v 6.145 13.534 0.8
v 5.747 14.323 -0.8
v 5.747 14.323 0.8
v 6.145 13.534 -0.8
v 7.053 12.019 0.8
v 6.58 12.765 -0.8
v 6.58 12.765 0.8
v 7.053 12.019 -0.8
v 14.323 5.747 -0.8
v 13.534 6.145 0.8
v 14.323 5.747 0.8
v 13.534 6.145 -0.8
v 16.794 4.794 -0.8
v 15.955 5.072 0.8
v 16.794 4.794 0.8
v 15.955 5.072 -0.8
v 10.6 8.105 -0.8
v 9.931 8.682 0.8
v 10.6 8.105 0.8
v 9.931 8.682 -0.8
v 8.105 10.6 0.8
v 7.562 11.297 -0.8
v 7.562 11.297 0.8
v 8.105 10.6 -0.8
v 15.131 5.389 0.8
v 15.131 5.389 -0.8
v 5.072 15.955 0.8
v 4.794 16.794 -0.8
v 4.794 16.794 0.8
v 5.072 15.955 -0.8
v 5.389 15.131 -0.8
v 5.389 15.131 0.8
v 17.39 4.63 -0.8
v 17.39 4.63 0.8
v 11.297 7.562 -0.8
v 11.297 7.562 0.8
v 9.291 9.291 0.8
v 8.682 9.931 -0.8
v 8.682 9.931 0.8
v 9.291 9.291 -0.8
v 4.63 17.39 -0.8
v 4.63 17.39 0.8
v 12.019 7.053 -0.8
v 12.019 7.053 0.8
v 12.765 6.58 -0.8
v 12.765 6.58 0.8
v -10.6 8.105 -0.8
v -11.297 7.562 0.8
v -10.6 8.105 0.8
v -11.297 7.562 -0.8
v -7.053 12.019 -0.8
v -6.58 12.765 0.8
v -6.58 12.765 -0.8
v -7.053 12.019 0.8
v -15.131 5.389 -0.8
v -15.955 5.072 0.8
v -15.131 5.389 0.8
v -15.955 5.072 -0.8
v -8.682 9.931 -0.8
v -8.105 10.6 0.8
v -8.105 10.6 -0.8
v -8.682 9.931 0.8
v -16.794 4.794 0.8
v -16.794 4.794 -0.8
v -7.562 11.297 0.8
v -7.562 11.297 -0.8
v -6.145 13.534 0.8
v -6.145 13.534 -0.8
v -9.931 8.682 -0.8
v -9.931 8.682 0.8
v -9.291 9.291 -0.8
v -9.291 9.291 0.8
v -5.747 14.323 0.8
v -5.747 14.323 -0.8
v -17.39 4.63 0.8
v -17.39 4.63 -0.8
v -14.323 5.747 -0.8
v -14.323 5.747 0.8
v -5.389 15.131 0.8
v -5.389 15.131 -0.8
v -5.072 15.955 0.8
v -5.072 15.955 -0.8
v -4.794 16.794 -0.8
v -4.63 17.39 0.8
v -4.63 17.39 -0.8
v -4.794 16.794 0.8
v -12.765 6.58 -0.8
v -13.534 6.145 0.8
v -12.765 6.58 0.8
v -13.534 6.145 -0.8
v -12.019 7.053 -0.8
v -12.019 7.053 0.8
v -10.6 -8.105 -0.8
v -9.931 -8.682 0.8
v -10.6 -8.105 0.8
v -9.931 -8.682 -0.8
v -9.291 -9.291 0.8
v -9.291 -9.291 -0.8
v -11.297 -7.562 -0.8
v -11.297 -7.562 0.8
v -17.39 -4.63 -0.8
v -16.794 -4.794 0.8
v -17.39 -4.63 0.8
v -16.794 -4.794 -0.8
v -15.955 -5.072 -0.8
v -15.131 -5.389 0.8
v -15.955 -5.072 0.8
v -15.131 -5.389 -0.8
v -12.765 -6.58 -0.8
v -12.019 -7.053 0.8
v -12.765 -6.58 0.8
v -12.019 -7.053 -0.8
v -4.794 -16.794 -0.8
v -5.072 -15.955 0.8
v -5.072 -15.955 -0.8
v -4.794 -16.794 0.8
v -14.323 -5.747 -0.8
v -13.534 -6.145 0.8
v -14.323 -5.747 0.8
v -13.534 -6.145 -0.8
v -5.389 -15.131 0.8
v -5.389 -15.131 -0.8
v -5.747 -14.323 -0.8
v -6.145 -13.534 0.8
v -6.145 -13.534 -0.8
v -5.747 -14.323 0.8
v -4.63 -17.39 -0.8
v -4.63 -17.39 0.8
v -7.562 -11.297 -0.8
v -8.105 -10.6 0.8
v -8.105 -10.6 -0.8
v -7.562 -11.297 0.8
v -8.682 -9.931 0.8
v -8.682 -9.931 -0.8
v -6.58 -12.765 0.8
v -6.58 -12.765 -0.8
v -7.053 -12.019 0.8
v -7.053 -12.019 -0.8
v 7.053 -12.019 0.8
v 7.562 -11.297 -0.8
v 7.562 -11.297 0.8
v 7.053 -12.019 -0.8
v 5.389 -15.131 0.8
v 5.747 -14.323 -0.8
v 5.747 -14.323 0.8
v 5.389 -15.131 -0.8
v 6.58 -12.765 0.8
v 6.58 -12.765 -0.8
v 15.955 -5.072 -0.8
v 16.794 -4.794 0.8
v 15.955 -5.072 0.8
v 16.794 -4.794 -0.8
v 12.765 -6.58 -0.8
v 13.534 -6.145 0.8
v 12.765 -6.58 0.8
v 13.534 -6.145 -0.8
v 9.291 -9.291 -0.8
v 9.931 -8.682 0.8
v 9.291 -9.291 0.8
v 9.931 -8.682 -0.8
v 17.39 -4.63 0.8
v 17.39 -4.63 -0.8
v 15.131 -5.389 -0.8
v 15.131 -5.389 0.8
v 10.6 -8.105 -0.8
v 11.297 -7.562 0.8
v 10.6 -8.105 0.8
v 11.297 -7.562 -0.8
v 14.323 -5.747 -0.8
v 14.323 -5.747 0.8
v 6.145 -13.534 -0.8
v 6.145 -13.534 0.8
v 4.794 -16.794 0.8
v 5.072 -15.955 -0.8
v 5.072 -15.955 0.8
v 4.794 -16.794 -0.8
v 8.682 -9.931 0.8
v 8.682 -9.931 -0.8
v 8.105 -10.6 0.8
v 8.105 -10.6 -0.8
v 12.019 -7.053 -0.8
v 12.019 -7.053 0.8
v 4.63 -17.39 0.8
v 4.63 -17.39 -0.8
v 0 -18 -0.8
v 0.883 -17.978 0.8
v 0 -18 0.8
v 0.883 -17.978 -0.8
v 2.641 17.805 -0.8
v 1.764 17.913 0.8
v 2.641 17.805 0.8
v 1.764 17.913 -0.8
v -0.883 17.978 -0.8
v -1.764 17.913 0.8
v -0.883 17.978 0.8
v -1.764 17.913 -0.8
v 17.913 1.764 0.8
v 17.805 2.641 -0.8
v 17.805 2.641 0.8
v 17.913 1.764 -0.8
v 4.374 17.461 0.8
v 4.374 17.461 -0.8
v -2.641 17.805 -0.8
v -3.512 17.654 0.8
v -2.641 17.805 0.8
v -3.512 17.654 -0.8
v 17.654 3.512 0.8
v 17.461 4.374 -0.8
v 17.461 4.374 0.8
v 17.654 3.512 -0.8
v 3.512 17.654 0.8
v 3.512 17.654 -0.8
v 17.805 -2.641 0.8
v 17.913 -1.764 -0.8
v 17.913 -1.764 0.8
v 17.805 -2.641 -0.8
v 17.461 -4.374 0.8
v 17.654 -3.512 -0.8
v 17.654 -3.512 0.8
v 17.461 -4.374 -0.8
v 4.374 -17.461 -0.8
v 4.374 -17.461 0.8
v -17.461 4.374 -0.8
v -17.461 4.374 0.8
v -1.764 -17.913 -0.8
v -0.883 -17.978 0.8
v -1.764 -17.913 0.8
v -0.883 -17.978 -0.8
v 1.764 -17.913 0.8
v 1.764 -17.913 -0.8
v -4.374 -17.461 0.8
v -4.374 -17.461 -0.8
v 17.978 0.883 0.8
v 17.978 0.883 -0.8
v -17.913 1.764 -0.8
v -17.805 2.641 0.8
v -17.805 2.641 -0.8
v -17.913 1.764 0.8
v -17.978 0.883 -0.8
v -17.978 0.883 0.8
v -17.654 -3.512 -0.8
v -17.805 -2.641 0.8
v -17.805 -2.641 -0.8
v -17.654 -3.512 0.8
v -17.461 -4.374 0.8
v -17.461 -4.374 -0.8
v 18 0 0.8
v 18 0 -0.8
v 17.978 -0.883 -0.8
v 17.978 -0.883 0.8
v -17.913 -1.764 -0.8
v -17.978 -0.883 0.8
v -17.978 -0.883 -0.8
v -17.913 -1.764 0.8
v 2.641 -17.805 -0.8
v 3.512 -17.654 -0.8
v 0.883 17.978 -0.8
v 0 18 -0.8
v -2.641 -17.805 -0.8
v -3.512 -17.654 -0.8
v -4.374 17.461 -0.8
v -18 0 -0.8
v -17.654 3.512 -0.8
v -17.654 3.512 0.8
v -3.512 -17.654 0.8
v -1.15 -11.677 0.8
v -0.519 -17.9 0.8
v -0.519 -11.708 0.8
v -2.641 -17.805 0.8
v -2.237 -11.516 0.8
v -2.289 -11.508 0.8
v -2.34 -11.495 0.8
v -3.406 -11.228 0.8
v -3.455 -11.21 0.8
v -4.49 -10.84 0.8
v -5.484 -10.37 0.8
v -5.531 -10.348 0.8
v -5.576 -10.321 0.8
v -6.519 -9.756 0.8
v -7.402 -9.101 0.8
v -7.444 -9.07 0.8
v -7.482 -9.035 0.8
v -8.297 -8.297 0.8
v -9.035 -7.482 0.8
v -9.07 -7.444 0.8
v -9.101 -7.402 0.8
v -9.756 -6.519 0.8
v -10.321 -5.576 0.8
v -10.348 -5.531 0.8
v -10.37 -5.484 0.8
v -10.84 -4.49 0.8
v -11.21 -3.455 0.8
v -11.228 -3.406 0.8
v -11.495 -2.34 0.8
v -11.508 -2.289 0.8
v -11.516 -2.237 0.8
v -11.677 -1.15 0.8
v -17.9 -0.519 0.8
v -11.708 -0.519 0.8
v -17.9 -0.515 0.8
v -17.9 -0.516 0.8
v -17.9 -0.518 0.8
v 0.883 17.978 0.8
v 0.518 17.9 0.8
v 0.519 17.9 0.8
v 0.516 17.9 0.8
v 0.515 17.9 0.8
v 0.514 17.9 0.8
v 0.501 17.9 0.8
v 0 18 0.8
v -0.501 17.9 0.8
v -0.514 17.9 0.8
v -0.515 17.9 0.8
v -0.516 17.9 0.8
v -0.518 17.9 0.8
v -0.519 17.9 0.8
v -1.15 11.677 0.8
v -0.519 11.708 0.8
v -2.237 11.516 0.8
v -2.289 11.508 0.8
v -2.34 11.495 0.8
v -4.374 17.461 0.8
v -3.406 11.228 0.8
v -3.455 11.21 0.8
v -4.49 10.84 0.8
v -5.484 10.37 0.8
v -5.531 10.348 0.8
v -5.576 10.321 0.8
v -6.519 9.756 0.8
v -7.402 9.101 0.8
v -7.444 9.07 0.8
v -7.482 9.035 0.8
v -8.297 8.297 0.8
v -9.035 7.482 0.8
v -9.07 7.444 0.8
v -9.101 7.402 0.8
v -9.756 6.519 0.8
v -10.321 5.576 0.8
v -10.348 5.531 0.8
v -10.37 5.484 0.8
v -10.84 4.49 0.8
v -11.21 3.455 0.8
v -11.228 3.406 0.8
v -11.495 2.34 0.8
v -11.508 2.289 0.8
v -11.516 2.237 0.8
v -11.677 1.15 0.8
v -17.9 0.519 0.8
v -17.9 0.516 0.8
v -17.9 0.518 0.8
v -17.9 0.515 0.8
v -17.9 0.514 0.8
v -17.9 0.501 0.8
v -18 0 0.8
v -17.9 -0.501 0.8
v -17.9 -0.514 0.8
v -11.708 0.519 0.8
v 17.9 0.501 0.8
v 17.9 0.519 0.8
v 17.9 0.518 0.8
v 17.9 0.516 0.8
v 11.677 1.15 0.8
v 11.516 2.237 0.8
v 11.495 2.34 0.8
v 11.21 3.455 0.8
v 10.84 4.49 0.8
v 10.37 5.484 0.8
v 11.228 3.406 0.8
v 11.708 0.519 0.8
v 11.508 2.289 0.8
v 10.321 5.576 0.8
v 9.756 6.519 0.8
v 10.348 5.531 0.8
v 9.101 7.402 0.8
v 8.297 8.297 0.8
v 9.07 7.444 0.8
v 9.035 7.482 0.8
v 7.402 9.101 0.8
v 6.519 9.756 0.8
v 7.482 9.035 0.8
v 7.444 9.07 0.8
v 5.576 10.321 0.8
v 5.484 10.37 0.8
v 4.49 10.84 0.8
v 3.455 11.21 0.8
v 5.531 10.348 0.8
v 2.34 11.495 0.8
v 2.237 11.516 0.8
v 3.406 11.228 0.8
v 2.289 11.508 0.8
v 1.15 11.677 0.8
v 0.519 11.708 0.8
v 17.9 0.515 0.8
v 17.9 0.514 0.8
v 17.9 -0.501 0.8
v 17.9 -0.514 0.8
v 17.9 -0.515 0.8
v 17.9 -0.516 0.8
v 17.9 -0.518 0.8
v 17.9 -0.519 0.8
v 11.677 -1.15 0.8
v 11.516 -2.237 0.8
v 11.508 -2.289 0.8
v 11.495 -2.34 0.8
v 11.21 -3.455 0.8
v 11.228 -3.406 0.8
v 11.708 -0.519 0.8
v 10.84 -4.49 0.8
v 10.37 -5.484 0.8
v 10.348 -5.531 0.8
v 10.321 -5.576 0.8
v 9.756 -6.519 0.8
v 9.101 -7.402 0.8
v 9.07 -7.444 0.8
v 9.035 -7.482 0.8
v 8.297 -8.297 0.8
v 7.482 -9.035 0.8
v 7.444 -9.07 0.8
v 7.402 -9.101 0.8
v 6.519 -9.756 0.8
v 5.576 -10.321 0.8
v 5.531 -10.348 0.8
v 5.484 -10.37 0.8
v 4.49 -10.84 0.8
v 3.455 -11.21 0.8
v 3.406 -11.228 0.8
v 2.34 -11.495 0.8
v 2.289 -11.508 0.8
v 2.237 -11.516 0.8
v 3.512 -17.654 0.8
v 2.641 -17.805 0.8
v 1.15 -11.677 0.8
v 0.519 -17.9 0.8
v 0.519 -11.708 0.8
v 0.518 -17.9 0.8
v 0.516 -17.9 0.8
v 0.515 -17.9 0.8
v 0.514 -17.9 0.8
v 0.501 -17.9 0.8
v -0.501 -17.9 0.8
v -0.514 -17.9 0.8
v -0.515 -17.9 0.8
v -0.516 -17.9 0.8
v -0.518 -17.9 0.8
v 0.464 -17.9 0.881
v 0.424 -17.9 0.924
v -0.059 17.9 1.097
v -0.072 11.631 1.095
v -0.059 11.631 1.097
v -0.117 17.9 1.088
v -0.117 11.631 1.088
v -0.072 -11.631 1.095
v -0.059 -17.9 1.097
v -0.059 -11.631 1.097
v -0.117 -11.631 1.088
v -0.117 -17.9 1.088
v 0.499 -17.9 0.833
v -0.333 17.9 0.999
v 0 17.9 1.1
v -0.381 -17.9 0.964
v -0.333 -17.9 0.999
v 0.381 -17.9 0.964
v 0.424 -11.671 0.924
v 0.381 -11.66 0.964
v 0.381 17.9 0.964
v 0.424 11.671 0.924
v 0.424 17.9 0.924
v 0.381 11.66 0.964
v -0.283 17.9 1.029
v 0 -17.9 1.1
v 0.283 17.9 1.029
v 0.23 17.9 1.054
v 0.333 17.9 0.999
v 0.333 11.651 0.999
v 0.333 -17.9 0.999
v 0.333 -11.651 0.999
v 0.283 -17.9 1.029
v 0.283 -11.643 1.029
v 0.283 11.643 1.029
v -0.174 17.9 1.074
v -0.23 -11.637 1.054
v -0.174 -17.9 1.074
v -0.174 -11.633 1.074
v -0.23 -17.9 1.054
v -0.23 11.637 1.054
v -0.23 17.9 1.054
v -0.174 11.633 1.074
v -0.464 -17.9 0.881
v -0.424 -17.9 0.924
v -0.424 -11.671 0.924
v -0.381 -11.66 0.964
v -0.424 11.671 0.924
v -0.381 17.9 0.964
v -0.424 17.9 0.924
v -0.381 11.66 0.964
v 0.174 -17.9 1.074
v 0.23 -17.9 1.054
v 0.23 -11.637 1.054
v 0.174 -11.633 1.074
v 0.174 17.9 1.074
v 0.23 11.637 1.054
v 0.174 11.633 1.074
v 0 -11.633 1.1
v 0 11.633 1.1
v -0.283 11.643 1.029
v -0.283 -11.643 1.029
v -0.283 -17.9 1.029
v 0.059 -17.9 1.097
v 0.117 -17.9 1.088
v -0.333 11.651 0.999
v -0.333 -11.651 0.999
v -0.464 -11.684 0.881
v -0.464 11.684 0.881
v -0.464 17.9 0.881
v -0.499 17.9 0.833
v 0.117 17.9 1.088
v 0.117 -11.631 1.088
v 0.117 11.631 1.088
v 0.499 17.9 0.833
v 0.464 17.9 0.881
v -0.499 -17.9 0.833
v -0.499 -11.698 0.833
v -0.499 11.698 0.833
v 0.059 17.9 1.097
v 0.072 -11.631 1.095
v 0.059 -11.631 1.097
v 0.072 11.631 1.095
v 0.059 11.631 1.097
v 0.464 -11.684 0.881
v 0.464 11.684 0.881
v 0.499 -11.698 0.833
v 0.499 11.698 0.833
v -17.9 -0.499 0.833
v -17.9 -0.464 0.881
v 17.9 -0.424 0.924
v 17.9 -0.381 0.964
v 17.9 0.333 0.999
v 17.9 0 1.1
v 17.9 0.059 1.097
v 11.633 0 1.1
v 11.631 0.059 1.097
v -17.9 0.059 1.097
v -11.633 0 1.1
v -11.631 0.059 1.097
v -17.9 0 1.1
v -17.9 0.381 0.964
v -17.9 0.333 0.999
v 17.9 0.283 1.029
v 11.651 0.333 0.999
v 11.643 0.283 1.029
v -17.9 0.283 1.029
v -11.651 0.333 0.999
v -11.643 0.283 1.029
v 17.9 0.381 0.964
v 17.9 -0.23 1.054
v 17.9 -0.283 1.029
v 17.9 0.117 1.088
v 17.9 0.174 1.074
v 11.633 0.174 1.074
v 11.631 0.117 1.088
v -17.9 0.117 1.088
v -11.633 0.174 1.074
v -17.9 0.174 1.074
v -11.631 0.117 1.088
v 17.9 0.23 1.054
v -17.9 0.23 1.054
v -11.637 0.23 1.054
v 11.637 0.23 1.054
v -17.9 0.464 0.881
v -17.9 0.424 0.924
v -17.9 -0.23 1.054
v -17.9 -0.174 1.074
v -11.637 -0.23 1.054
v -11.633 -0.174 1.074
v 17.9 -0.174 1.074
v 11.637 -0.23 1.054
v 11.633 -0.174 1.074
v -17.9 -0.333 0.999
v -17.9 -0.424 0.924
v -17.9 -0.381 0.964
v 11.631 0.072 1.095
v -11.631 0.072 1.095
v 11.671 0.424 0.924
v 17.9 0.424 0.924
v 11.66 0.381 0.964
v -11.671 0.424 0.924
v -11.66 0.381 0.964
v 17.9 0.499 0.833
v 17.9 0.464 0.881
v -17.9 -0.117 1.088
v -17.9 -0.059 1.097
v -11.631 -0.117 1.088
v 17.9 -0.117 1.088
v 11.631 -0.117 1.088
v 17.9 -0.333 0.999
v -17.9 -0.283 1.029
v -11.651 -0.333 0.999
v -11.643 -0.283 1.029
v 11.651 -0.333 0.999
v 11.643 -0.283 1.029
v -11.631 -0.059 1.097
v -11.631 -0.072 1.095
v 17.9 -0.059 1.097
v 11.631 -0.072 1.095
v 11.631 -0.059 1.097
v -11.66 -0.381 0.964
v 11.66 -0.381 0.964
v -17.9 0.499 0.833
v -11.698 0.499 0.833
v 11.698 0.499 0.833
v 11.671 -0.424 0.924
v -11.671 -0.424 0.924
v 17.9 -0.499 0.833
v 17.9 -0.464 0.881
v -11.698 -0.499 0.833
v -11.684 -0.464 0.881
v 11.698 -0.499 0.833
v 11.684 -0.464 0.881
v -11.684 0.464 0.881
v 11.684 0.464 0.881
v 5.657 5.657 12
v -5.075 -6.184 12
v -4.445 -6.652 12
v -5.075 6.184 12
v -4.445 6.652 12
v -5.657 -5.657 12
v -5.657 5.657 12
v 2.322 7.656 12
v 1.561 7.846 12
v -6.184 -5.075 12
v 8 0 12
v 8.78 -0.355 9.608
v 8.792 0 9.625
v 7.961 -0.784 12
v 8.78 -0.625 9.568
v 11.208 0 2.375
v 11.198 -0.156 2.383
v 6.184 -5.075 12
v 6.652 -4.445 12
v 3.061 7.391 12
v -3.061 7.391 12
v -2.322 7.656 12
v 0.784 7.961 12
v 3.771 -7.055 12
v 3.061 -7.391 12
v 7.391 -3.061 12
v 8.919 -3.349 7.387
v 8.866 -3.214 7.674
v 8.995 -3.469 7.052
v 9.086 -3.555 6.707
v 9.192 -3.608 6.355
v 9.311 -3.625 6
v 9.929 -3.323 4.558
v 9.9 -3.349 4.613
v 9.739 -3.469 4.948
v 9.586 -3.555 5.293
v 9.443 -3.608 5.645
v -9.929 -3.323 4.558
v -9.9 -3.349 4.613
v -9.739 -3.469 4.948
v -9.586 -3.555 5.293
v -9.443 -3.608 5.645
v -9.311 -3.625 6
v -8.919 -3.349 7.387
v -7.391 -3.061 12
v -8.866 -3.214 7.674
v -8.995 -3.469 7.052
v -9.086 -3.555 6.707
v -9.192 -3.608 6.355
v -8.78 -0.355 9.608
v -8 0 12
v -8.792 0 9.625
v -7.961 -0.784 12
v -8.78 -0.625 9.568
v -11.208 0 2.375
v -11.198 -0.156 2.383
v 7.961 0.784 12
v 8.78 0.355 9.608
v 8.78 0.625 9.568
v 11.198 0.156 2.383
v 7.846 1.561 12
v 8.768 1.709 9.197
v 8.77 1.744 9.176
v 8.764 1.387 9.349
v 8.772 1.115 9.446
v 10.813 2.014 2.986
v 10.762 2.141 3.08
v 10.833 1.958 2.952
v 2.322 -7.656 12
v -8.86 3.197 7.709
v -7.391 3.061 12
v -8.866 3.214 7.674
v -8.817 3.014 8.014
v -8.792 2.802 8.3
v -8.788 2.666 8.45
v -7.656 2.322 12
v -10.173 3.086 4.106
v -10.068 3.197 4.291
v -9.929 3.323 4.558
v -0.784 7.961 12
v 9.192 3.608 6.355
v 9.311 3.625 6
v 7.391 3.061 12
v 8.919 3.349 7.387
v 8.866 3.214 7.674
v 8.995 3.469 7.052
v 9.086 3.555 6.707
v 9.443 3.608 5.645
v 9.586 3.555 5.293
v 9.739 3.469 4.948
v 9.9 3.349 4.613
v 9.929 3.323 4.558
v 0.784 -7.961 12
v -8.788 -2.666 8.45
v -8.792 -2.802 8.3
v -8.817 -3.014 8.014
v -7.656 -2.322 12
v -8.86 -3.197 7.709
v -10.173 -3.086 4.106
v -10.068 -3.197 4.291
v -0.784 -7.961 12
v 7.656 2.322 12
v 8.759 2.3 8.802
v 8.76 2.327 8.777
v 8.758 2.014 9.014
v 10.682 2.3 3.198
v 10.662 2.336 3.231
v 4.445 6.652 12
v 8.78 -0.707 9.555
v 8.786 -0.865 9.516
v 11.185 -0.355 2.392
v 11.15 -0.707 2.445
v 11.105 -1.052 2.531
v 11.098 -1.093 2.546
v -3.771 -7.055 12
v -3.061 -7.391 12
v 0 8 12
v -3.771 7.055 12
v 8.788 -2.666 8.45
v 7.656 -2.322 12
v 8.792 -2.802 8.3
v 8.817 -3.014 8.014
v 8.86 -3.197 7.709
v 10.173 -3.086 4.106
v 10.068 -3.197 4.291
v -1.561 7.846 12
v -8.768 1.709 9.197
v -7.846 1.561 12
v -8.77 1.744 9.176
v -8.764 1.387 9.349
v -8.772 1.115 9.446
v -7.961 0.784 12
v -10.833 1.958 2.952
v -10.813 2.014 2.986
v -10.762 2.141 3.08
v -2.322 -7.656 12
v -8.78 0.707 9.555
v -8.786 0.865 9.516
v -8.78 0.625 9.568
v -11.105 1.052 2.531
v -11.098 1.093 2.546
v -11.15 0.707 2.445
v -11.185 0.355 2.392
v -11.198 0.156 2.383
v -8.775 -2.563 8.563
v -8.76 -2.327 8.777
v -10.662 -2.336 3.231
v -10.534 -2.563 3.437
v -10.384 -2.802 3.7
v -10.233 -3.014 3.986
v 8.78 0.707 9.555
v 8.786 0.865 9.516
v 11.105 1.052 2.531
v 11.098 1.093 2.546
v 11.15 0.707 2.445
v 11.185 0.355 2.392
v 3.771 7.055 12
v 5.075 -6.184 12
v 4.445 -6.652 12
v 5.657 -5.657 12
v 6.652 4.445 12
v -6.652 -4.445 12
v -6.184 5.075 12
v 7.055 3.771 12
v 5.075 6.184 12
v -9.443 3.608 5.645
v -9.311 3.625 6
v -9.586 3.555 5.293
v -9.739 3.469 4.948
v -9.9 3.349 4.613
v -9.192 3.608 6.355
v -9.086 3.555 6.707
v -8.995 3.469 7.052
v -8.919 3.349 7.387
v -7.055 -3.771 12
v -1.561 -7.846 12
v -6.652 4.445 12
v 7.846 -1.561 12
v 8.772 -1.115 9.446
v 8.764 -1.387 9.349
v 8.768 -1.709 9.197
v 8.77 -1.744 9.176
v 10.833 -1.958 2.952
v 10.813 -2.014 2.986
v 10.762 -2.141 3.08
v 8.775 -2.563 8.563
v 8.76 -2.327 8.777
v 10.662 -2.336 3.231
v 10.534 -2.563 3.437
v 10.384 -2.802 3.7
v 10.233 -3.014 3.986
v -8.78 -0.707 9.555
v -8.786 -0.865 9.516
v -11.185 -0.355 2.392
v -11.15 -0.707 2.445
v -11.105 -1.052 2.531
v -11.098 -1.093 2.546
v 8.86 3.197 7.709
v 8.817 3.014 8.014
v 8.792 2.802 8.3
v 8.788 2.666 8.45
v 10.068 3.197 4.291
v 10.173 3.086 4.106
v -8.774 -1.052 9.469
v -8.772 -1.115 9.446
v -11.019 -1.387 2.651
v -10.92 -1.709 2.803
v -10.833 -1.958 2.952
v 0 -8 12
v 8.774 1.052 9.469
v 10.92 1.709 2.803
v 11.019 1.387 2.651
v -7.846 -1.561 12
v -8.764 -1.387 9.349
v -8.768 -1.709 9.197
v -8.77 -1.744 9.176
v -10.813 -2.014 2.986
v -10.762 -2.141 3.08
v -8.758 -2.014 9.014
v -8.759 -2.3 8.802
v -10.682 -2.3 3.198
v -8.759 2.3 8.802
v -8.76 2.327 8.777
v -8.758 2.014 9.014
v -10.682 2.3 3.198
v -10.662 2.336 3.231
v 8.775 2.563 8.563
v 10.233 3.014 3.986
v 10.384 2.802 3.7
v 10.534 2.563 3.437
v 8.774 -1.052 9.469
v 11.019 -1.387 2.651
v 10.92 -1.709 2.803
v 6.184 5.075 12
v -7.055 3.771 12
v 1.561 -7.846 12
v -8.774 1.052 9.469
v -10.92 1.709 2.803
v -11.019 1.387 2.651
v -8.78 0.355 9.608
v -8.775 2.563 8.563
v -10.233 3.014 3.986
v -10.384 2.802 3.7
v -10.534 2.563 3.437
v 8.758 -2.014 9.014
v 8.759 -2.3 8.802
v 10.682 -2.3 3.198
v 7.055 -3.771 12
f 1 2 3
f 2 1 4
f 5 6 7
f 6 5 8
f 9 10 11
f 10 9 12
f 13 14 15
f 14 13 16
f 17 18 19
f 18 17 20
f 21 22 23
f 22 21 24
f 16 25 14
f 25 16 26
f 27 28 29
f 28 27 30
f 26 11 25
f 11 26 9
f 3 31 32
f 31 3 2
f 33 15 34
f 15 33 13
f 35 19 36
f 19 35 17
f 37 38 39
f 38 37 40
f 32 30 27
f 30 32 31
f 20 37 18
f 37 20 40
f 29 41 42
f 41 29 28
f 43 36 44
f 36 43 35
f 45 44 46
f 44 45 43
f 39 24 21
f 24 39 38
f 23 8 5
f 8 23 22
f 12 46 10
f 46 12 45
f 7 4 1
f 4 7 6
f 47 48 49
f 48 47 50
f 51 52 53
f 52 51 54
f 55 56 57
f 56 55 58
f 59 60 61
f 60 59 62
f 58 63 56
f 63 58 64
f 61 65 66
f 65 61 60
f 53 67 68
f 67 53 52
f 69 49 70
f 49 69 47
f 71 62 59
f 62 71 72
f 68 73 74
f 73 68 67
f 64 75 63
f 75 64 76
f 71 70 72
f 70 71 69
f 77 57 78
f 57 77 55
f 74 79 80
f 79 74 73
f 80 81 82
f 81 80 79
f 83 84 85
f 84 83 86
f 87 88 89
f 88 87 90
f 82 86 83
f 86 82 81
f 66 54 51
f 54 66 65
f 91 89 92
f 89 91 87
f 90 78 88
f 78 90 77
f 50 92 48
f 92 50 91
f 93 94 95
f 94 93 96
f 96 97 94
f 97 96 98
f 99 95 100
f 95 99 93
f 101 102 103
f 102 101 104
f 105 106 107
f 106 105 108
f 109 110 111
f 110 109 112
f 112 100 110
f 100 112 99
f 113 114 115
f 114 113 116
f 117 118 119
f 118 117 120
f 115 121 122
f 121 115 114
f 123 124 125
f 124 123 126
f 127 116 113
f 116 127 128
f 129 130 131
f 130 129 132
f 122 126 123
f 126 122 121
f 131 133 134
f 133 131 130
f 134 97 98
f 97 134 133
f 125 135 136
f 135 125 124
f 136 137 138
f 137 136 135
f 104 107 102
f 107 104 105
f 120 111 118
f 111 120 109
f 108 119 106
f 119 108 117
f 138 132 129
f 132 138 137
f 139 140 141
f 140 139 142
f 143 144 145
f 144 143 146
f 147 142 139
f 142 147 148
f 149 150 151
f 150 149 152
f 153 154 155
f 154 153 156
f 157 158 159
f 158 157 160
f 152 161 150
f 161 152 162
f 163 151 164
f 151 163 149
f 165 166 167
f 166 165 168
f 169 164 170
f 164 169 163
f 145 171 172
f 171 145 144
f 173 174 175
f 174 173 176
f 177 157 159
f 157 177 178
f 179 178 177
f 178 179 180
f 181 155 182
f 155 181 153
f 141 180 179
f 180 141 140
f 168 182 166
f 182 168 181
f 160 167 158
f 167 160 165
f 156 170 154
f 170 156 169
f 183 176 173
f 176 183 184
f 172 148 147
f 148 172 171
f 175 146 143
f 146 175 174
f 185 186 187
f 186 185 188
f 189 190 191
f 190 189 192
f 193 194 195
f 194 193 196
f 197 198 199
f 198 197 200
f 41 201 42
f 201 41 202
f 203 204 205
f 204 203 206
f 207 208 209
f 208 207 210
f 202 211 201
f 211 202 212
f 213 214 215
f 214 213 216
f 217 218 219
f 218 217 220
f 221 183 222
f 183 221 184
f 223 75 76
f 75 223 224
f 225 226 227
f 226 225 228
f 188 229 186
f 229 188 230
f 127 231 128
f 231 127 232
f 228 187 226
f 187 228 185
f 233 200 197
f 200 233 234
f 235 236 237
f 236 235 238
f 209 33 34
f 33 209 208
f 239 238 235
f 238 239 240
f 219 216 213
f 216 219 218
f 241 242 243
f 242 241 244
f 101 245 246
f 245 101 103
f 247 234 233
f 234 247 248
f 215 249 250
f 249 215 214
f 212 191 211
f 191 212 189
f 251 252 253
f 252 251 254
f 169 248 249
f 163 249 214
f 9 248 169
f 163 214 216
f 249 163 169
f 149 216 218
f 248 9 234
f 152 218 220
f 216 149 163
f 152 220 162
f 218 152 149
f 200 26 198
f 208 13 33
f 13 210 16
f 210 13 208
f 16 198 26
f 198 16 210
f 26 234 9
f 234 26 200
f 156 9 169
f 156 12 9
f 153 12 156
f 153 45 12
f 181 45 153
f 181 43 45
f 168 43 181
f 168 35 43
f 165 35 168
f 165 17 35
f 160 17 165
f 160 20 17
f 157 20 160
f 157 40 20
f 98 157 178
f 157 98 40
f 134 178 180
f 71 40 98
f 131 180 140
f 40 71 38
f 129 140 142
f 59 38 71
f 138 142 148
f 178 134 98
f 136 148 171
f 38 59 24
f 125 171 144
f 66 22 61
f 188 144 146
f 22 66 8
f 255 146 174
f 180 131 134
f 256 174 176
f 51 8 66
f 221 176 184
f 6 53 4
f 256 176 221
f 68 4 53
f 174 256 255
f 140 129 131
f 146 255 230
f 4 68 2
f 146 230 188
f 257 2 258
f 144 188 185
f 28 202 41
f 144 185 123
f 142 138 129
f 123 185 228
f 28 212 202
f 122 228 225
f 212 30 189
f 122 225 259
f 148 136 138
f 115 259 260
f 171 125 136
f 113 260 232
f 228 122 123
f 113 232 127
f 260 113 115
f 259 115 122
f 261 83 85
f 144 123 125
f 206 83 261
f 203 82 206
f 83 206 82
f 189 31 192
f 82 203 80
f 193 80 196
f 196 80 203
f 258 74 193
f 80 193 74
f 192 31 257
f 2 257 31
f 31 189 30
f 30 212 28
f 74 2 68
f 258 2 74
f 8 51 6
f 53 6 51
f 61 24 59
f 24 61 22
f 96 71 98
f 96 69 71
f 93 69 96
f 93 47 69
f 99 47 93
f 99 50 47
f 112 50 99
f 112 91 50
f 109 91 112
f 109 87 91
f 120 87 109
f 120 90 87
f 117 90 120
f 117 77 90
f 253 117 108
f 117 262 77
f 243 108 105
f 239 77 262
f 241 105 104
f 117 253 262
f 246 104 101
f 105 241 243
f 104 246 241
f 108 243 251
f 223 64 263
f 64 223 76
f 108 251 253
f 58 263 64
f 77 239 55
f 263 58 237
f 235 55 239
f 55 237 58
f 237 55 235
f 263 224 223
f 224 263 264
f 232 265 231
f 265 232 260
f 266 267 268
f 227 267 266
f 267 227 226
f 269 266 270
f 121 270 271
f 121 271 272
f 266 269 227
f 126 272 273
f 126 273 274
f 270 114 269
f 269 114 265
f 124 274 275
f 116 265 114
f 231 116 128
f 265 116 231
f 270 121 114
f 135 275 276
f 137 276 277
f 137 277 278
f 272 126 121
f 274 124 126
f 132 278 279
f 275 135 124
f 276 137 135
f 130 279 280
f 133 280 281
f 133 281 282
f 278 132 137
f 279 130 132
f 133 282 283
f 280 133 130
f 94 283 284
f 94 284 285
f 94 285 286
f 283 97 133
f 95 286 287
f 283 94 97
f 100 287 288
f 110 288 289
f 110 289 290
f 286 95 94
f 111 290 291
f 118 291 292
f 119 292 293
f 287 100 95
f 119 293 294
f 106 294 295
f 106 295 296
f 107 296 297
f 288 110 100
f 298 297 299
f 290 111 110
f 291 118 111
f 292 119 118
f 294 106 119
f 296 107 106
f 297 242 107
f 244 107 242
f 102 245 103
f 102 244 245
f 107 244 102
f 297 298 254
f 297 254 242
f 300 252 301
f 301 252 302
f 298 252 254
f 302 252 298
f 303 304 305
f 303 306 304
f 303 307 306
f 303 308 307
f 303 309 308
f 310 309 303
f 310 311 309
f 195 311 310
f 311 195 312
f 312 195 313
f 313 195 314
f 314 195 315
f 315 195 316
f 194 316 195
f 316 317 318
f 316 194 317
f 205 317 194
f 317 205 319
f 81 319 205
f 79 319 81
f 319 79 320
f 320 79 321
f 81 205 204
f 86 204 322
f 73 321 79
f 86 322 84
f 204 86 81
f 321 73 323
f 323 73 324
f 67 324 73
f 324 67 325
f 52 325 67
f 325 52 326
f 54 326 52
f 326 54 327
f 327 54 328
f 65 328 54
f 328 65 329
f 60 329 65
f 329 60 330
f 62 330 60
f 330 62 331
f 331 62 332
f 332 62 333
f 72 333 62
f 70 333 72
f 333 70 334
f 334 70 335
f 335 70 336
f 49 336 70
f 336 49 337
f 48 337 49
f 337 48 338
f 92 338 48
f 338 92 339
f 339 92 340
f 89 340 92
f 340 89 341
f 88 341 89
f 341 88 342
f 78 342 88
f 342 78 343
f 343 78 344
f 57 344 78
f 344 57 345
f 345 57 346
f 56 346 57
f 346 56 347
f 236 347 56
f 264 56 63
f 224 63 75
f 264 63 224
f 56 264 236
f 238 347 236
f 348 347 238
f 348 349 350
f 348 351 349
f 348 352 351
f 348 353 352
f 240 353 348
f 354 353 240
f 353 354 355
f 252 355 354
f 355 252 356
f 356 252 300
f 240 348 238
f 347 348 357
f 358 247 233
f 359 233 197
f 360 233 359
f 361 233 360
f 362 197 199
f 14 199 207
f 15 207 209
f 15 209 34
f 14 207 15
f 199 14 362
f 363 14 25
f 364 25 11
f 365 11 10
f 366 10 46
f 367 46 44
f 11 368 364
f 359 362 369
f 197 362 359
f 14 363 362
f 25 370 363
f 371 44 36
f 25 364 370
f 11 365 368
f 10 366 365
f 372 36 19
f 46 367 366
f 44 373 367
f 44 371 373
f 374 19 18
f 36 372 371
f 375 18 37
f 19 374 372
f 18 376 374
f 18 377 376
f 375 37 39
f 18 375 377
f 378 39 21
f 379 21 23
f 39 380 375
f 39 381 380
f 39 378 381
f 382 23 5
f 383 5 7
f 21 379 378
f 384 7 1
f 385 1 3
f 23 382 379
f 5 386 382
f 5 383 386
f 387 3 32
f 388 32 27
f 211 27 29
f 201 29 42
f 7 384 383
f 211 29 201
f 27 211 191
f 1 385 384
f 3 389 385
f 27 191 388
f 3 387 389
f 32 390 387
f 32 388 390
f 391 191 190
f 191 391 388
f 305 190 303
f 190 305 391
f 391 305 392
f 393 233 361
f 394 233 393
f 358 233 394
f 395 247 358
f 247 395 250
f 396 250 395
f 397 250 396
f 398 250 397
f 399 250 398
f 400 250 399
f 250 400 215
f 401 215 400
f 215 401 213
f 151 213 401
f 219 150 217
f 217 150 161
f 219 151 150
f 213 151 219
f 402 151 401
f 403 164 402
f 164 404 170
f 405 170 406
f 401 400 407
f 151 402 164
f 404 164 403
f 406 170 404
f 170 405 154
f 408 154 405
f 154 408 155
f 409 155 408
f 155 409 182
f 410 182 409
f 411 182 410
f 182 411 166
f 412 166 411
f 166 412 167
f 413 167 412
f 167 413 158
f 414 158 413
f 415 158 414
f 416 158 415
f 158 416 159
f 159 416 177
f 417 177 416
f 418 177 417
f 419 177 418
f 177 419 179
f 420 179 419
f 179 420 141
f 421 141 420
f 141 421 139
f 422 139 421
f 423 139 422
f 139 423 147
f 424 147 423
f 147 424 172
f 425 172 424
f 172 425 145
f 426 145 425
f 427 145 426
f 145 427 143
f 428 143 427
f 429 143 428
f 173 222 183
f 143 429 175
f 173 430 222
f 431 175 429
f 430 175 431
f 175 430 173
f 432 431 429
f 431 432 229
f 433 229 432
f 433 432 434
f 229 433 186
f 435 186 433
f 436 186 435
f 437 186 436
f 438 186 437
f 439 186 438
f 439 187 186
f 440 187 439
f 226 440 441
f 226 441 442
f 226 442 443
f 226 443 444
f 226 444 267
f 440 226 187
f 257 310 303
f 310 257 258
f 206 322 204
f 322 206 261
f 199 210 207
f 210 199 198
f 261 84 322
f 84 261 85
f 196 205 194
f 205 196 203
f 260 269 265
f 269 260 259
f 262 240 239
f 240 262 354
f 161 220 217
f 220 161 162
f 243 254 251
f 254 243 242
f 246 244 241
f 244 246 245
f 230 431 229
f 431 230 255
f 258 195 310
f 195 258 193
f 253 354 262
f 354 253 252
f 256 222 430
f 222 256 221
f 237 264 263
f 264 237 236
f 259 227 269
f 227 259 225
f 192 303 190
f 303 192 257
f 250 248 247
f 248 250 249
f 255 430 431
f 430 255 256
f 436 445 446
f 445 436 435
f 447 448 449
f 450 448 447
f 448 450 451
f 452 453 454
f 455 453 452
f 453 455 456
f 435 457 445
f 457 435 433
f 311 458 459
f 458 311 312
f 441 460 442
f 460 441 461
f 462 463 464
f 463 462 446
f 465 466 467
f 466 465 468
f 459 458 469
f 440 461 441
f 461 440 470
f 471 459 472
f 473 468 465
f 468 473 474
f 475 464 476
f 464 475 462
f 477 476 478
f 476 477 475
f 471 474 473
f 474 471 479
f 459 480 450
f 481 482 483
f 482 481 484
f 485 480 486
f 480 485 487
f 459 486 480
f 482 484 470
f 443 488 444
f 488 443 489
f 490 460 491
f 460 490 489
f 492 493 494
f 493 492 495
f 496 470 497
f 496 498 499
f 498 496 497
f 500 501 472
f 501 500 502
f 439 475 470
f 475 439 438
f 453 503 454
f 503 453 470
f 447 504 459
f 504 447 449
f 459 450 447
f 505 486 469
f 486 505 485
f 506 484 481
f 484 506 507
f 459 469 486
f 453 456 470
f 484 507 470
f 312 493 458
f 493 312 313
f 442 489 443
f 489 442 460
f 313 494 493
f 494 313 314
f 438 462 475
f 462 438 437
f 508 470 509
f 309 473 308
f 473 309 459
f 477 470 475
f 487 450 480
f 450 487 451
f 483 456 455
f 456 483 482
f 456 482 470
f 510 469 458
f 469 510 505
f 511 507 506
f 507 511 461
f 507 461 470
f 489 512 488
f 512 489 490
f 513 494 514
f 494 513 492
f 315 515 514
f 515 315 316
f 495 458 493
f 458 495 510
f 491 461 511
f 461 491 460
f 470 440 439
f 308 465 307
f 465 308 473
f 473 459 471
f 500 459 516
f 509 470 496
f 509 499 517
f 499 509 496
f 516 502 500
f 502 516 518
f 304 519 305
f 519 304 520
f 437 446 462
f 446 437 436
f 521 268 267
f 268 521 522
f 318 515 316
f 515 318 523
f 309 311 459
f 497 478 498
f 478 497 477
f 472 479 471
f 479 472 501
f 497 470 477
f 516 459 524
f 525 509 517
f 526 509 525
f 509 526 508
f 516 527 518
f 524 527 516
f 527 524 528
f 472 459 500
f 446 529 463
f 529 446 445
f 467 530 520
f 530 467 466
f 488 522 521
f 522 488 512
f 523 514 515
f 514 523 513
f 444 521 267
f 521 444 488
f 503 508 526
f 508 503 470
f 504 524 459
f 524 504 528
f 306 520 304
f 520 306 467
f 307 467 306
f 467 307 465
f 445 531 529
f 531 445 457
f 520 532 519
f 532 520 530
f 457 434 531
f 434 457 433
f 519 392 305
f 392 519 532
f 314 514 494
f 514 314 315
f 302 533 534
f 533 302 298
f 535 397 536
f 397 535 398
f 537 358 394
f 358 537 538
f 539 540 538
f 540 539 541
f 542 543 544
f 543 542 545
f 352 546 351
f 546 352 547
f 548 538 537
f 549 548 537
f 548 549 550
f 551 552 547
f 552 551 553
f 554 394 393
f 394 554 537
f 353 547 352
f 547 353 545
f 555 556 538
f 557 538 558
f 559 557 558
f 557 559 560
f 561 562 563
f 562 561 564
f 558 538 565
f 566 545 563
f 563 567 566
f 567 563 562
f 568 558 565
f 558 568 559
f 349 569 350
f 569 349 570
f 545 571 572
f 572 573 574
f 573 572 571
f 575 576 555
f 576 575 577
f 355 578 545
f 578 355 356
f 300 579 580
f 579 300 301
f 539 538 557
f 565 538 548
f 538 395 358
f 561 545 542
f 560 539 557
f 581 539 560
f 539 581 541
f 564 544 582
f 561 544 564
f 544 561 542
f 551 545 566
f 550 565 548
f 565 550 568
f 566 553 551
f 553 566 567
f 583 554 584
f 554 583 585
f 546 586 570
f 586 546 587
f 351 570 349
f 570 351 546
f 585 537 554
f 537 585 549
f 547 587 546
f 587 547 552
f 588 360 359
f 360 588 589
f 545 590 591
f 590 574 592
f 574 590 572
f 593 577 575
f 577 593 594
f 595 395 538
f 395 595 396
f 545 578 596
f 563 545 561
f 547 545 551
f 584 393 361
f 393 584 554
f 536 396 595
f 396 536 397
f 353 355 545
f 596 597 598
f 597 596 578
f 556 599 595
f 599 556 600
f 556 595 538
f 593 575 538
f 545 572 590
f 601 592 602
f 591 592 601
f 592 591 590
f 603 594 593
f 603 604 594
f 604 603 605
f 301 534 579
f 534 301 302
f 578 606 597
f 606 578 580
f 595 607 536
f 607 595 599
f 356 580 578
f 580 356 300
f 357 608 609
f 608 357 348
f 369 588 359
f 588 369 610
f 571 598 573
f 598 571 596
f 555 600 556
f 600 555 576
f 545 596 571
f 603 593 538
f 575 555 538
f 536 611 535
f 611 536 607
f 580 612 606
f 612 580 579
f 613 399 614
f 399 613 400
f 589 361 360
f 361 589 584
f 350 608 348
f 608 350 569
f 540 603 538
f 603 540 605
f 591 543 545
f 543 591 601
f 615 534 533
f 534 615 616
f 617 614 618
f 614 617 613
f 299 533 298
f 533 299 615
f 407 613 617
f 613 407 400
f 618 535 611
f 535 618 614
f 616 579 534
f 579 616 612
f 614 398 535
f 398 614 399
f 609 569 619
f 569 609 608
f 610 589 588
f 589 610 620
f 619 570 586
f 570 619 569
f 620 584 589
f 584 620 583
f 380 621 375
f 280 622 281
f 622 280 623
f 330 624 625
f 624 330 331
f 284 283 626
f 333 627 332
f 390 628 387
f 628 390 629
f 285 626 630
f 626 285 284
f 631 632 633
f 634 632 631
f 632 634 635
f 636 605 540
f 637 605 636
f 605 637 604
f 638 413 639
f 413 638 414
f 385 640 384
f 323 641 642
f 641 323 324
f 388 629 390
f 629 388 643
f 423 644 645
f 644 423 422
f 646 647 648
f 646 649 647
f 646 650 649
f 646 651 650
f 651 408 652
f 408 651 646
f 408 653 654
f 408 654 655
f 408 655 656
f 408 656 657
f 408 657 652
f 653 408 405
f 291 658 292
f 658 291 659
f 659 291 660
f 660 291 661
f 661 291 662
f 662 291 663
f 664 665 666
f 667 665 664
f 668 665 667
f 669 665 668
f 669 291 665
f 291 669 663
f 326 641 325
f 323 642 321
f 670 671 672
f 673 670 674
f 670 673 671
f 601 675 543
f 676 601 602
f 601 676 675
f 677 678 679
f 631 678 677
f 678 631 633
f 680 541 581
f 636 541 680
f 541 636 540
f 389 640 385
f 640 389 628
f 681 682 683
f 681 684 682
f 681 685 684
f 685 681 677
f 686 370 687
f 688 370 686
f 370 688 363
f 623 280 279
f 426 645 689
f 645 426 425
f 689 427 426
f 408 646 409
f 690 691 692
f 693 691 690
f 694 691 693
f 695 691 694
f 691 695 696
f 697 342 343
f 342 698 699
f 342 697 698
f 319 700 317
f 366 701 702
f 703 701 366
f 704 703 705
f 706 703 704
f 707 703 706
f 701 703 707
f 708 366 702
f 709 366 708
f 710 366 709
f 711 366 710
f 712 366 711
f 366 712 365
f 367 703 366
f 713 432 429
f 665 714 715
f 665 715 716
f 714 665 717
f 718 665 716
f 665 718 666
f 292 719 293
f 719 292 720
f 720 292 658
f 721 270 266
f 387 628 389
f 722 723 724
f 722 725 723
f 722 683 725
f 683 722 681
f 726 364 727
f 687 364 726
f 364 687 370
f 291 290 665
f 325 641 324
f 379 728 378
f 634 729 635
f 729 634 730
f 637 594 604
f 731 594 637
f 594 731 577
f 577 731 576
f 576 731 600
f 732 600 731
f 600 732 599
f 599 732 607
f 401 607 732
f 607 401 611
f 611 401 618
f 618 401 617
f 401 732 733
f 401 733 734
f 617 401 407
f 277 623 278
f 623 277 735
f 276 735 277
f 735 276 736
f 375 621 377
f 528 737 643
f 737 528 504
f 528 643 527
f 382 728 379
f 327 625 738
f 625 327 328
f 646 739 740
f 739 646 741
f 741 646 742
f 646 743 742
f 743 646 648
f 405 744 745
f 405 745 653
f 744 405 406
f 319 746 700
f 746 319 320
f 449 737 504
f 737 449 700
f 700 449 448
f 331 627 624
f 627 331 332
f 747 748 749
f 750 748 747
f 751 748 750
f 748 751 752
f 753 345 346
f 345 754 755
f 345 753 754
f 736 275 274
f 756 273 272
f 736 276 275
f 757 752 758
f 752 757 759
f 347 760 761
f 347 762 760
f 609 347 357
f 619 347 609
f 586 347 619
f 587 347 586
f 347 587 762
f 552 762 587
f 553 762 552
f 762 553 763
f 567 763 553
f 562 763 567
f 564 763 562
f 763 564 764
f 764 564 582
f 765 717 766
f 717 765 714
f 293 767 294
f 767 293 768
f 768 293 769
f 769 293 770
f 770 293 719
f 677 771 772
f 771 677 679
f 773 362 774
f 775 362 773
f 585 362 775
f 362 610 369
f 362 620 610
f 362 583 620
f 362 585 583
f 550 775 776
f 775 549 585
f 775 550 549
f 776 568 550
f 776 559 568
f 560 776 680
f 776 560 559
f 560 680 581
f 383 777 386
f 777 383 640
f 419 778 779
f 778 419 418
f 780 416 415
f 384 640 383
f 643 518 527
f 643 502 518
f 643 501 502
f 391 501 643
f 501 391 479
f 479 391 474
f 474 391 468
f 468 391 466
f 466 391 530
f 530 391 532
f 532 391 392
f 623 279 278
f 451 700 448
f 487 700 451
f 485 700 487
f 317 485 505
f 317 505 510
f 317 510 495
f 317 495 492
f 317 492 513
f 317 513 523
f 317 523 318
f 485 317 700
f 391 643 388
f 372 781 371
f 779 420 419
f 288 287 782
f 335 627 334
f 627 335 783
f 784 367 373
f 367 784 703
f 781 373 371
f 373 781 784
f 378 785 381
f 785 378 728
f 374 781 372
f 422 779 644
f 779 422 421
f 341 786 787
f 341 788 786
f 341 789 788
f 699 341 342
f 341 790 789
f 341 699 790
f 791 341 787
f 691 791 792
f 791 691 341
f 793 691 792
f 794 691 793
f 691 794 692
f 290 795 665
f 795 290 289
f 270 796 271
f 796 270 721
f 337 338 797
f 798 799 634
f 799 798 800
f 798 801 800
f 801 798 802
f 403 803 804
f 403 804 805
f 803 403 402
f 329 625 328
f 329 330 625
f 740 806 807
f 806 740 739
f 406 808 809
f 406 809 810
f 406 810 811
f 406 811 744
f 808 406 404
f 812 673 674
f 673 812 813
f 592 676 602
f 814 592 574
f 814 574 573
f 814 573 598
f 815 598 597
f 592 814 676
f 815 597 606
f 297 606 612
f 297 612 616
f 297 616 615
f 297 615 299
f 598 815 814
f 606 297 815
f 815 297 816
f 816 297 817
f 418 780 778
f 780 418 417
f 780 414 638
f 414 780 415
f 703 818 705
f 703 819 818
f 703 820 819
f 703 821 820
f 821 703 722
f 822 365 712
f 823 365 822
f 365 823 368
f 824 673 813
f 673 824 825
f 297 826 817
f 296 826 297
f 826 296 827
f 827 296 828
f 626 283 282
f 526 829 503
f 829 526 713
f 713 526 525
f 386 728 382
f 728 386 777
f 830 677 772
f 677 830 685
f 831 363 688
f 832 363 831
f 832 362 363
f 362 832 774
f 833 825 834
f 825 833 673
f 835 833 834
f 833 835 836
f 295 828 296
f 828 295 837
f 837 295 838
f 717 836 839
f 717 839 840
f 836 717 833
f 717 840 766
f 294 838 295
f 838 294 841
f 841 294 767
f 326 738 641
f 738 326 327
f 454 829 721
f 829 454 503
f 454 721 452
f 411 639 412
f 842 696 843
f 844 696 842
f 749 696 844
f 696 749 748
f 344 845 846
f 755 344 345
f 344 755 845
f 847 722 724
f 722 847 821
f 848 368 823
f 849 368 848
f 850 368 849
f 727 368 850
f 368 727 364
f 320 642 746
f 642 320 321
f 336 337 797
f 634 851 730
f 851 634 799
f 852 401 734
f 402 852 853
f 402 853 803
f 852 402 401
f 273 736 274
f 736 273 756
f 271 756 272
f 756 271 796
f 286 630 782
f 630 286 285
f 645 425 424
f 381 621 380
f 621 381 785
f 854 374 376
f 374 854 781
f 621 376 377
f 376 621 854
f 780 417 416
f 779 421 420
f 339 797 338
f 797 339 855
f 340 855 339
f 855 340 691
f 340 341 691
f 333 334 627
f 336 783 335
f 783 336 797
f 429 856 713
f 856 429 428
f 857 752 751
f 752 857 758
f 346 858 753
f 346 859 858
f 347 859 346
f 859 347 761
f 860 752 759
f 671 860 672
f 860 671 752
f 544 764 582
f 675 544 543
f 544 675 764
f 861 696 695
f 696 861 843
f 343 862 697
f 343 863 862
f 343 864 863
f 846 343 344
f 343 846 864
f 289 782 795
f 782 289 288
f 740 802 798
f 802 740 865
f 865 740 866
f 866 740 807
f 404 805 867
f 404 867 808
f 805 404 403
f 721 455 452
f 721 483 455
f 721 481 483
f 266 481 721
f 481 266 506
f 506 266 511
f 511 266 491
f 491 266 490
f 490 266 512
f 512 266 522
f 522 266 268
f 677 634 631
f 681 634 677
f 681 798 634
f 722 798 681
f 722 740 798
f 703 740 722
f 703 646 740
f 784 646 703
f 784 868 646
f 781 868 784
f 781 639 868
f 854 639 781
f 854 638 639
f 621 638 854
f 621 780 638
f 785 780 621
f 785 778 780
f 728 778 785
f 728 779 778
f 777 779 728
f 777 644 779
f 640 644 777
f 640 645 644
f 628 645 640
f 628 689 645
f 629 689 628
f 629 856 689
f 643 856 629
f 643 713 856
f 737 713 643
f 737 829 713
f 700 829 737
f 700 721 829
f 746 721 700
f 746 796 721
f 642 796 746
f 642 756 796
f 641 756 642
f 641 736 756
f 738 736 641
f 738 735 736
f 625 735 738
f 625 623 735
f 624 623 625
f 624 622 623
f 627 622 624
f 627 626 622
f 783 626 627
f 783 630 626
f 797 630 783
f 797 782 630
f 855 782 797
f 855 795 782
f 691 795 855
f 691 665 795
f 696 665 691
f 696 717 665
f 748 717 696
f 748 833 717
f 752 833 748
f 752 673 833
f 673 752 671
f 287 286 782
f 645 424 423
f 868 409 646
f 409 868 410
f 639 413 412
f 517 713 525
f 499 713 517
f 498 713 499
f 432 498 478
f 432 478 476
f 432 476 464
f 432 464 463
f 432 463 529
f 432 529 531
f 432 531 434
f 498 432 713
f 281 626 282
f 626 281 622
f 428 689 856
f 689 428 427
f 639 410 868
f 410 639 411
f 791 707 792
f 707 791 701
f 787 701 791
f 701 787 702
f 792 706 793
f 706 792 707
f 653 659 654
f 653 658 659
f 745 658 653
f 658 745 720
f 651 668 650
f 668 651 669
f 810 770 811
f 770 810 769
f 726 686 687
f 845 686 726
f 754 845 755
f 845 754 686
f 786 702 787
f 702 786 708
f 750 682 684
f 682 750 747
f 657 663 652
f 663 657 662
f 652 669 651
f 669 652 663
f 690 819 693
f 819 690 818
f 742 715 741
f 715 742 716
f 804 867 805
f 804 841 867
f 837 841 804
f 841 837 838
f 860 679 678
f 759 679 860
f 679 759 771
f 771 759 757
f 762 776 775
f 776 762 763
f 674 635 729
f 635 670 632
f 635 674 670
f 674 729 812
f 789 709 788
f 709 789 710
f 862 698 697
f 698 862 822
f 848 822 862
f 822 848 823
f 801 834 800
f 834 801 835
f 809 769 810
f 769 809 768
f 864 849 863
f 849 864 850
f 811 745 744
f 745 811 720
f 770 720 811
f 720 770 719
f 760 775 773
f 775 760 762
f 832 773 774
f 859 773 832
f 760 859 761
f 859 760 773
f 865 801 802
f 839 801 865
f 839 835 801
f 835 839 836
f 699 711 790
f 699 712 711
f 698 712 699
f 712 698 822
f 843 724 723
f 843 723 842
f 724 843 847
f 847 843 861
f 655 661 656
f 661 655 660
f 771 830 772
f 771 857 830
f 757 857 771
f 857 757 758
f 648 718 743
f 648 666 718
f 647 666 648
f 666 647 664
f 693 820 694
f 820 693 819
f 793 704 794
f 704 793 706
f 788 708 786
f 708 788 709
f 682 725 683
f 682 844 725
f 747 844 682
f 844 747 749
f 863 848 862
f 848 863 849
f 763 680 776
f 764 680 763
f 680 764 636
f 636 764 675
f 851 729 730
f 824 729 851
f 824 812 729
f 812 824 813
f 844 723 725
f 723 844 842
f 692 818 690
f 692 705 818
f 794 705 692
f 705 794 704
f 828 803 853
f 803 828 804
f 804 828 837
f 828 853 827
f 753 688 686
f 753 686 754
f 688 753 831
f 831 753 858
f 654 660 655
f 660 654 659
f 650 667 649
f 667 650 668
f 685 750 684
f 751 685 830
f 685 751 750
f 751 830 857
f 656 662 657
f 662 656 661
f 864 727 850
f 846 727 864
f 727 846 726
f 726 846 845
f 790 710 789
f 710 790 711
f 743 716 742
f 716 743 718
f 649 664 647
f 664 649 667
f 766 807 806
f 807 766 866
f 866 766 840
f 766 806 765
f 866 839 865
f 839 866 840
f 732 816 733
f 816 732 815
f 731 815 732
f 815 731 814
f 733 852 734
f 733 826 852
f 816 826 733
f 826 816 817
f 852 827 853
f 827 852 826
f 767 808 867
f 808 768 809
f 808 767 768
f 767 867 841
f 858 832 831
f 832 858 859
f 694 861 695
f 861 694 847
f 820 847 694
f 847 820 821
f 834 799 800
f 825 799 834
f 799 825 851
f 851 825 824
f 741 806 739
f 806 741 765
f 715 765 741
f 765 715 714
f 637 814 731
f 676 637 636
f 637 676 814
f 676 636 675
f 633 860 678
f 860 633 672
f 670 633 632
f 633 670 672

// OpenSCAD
module snapRings() {
    H=35.8;
    rotate([0,90,45])
    cylinder(h=H, r=1.2/2, center=true, $fn=64);

    rotate([0,90,-45])
    cylinder(h=H, r=1.2/2, center=true, $fn=64);    
}

module holes() {
        R = 36/2;
        ratio=1.73;

        translate([1,0,0]*R*ratio)
        cylinder(h=2, r=R, $fn=128, center=true);
        
        translate([0,1,0]*R*ratio)
        cylinder(h=2, r=R, $fn=128, center=true);
        
        
        translate([-1,0,0]*R*ratio)
        cylinder(h=2, r=R, $fn=128, center=true);
        
        translate([0,-1,0]*R*ratio)
        cylinder(h=2, r=R, $fn=128, center=true);
}

module interface() {
    union() {
        difference() {
            cylinder(h=1.6, r=36/2, $fn=128, center=true);        
            holes();
        }
    
        translate([0,0,1]*.5)
        snapRings();
        
        difference() {
        
            translate([0,0,6])
                cylinder(h=12, r2=16/2,r1=24/2,center=true, $fn=64);

            translate([0,0,1]*6)
            rotate([90,0,45])
            cylinder(h=30, r=7.25/2,center=true, $fn=64);            
        }
    }
}

rotate([0,0,45])
    interface();
